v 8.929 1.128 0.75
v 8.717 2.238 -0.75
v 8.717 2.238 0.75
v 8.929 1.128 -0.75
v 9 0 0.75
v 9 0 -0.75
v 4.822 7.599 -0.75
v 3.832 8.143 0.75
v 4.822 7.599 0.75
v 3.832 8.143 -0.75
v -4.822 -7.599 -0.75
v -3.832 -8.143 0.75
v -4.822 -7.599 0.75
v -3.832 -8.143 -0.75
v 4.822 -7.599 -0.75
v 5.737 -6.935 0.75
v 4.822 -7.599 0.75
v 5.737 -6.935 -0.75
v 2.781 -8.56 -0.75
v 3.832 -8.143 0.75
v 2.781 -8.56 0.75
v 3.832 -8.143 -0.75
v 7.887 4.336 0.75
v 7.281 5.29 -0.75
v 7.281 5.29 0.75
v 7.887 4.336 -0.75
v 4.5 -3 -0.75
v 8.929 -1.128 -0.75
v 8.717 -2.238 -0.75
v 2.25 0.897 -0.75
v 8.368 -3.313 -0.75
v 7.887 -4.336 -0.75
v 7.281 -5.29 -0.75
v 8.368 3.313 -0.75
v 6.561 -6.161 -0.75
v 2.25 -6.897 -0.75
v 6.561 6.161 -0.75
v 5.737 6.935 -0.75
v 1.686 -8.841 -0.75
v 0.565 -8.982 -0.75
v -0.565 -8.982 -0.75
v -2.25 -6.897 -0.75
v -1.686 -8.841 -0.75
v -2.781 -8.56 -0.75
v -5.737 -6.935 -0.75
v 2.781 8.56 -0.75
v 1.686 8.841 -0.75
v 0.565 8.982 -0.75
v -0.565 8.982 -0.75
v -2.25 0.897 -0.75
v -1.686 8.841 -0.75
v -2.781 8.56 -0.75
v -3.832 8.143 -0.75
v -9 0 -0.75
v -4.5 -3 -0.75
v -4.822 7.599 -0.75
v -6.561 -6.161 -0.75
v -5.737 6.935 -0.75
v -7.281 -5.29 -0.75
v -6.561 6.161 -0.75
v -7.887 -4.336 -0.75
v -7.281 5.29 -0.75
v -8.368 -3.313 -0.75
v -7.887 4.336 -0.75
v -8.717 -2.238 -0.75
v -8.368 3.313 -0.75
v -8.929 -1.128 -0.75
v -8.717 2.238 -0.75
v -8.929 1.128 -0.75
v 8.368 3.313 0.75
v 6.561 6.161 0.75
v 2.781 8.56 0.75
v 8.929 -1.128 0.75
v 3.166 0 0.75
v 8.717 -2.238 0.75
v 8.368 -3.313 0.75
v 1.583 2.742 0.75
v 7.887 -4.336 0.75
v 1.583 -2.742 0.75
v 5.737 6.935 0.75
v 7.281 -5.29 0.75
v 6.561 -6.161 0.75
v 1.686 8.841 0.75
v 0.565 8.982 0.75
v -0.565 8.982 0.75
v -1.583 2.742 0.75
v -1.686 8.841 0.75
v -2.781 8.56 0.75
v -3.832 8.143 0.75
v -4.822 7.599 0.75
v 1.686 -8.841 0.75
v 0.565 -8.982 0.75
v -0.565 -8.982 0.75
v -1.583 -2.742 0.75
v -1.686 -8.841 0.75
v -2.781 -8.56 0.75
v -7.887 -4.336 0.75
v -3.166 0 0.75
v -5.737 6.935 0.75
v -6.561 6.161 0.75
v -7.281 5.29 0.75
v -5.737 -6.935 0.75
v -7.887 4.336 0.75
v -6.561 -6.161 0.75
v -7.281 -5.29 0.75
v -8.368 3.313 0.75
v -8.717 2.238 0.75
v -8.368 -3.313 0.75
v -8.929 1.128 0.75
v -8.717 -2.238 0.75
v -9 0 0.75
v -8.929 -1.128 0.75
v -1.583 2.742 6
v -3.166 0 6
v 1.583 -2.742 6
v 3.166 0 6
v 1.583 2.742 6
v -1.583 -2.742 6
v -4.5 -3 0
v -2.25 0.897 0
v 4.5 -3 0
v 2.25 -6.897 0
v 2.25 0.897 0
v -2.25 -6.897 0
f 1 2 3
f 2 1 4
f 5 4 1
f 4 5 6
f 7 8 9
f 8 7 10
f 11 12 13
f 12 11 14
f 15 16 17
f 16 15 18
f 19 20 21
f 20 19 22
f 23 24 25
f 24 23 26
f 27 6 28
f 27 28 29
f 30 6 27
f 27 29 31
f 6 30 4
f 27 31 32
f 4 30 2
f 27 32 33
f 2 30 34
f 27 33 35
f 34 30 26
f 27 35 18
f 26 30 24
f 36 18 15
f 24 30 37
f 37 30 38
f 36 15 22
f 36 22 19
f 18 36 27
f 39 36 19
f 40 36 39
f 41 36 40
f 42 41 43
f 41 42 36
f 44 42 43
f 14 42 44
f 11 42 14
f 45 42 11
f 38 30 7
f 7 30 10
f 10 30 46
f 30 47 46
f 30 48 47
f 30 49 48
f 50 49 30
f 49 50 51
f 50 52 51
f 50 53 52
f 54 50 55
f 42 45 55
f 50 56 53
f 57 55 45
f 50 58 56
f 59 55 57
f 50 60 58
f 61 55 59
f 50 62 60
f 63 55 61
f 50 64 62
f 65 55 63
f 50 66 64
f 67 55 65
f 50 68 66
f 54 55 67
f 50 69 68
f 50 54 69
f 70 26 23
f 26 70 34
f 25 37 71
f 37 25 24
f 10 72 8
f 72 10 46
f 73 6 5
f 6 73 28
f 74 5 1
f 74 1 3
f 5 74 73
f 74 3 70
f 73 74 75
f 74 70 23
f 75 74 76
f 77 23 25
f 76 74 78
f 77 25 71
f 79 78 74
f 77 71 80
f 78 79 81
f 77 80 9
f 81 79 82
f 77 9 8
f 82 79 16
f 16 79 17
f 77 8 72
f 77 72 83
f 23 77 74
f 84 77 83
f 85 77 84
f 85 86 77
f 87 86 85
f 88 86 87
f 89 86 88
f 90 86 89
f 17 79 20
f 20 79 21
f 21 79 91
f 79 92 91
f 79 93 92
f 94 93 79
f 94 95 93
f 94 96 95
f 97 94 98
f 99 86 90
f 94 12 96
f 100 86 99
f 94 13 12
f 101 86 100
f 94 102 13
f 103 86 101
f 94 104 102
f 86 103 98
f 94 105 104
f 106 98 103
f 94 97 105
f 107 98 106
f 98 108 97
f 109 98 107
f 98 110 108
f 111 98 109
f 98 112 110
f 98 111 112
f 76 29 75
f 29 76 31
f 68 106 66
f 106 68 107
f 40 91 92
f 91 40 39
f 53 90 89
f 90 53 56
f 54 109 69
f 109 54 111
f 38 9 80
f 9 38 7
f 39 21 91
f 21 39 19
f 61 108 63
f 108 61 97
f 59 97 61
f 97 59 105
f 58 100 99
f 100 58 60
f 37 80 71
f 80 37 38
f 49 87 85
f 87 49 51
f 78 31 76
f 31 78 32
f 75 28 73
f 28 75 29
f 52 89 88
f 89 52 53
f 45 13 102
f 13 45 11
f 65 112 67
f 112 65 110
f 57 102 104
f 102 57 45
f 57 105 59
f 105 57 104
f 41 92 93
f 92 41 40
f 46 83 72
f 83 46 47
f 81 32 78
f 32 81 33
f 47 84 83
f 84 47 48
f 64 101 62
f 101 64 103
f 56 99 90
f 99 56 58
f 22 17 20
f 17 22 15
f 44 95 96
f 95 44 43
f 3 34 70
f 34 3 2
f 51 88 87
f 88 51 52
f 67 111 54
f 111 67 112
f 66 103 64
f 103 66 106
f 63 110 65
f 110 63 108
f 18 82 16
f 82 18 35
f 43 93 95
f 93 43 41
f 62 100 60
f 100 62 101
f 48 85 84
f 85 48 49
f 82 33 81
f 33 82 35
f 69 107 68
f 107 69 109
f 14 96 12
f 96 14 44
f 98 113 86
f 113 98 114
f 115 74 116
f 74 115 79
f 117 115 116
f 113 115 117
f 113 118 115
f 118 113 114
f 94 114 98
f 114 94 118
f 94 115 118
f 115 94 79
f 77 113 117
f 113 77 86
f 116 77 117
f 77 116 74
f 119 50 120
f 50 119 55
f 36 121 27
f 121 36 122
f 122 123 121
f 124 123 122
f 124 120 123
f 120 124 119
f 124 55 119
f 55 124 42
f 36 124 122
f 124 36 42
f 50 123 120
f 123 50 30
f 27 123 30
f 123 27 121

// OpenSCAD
$fn = 50;


difference() {
	union() {
		translate(v = [0, 0, -0.7500000000]) {
			cylinder(h = 1.5000000000, r = 9.0000000000);
		}
		linear_extrude(height = 6) {
			polygon(points = [[3.1658550000, 0.0000000000], [1.5829275000, 2.7417108547], [-1.5829275000, 2.7417108547], [-3.1658550000, 0.0000000000], [-1.5829275000, -2.7417108547], [1.5829275000, -2.7417108547]]);
		}
	}
	union() {
		translate(v = [0, -3, -1.0000000000]) {
			#linear_extrude(height = 1) {
				polygon(points = [[4.5000000000, 0.0000000000], [2.2500000000, 3.8971143170], [-2.2500000000, 3.8971143170], [-4.5000000000, 0.0000000000], [-2.2500000000, -3.8971143170], [2.2500000000, -3.8971143170]]);
			}
		}
		#translate(v = [0, -3, -10]) {
			linear_extrude(height = 1) {
				text(font = "Arial", halign = "center", size = 2.5000000000, text = "", valign = "center");
			}
		}
	}
}
